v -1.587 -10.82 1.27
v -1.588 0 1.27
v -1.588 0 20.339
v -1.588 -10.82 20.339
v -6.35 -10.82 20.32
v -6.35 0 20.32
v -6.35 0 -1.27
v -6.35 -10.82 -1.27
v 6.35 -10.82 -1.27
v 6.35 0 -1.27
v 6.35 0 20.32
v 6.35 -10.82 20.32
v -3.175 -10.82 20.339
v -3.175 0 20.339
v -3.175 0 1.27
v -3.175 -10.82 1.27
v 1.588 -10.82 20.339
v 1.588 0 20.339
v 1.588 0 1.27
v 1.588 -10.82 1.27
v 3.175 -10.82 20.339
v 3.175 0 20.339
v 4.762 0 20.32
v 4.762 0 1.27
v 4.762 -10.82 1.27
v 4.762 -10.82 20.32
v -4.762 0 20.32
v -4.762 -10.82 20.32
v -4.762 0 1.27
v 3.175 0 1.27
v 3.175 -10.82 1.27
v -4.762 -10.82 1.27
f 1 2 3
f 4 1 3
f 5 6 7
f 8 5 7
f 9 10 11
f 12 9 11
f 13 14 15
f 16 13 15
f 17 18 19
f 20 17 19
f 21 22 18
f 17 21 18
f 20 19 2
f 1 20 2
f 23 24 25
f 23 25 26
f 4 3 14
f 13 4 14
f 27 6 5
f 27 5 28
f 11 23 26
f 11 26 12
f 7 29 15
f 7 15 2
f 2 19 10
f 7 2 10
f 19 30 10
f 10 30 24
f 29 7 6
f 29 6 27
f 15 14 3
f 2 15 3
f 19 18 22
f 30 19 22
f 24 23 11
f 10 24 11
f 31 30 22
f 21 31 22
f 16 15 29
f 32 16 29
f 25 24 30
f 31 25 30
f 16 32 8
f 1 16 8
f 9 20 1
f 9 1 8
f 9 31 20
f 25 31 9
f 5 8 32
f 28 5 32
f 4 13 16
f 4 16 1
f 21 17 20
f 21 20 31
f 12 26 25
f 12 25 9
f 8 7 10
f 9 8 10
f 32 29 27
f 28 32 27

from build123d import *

# Parameters (mm, degrees)
F0_W     = 1.5875
F0_H     = 19.05
F1_DEPTH = 30.48
F2_DEPTH = 19.6596
F4_DEPTH = 10.8204


with BuildPart() as f1:
    # F0 (on Front) → F1 (new body)
    with BuildSketch(Plane.XZ):
        with Locations((-5.55625, 10.795)):
            Rectangle(F0_W, F0_H)
        Polygon((-4.7625, 1.27), (-6.35, 1.27), (-6.35, -1.27), (6.35, -1.27), (6.35, 1.27), (4.7625, 1.27), align=None)
        with Locations((5.55625, 10.795)):
            Rectangle(F0_W, F0_H)
    extrude(amount=F1_DEPTH)

    # F1_face (on face) → F2 (cut)
    with BuildSketch(Plane(origin=(0, -30.48, 7.040217), x_dir=(1, 0, 0), z_dir=(0, -1, 0))):
        Polygon((-6.35, 13.279783), (-6.35, -8.310217), (6.35, -8.310217), (6.35, 13.279783), (4.7625, 13.279783), (4.7625, -5.770217), (-4.7625, -5.770217), (-4.7625, 13.279783), align=None)
    extrude(amount=-F2_DEPTH, mode=Mode.SUBTRACT)

    # F3 (on Front) → F4 (join)
    with BuildSketch(Plane.XZ):
        Polygon((-1.5875, 20.338782), (-3.175, 20.338782), (-3.175, 1.288782), (-3.175, 0), (-1.5875, 0), (-1.5875, 1.288782), align=None)
        Polygon((3.175, 20.338782), (1.5875, 20.338782), (1.5875, 1.288782), (1.5875, 0), (3.175, 0), (3.175, 1.288782), align=None)
    extrude(amount=F4_DEPTH)


solid = f1.part
